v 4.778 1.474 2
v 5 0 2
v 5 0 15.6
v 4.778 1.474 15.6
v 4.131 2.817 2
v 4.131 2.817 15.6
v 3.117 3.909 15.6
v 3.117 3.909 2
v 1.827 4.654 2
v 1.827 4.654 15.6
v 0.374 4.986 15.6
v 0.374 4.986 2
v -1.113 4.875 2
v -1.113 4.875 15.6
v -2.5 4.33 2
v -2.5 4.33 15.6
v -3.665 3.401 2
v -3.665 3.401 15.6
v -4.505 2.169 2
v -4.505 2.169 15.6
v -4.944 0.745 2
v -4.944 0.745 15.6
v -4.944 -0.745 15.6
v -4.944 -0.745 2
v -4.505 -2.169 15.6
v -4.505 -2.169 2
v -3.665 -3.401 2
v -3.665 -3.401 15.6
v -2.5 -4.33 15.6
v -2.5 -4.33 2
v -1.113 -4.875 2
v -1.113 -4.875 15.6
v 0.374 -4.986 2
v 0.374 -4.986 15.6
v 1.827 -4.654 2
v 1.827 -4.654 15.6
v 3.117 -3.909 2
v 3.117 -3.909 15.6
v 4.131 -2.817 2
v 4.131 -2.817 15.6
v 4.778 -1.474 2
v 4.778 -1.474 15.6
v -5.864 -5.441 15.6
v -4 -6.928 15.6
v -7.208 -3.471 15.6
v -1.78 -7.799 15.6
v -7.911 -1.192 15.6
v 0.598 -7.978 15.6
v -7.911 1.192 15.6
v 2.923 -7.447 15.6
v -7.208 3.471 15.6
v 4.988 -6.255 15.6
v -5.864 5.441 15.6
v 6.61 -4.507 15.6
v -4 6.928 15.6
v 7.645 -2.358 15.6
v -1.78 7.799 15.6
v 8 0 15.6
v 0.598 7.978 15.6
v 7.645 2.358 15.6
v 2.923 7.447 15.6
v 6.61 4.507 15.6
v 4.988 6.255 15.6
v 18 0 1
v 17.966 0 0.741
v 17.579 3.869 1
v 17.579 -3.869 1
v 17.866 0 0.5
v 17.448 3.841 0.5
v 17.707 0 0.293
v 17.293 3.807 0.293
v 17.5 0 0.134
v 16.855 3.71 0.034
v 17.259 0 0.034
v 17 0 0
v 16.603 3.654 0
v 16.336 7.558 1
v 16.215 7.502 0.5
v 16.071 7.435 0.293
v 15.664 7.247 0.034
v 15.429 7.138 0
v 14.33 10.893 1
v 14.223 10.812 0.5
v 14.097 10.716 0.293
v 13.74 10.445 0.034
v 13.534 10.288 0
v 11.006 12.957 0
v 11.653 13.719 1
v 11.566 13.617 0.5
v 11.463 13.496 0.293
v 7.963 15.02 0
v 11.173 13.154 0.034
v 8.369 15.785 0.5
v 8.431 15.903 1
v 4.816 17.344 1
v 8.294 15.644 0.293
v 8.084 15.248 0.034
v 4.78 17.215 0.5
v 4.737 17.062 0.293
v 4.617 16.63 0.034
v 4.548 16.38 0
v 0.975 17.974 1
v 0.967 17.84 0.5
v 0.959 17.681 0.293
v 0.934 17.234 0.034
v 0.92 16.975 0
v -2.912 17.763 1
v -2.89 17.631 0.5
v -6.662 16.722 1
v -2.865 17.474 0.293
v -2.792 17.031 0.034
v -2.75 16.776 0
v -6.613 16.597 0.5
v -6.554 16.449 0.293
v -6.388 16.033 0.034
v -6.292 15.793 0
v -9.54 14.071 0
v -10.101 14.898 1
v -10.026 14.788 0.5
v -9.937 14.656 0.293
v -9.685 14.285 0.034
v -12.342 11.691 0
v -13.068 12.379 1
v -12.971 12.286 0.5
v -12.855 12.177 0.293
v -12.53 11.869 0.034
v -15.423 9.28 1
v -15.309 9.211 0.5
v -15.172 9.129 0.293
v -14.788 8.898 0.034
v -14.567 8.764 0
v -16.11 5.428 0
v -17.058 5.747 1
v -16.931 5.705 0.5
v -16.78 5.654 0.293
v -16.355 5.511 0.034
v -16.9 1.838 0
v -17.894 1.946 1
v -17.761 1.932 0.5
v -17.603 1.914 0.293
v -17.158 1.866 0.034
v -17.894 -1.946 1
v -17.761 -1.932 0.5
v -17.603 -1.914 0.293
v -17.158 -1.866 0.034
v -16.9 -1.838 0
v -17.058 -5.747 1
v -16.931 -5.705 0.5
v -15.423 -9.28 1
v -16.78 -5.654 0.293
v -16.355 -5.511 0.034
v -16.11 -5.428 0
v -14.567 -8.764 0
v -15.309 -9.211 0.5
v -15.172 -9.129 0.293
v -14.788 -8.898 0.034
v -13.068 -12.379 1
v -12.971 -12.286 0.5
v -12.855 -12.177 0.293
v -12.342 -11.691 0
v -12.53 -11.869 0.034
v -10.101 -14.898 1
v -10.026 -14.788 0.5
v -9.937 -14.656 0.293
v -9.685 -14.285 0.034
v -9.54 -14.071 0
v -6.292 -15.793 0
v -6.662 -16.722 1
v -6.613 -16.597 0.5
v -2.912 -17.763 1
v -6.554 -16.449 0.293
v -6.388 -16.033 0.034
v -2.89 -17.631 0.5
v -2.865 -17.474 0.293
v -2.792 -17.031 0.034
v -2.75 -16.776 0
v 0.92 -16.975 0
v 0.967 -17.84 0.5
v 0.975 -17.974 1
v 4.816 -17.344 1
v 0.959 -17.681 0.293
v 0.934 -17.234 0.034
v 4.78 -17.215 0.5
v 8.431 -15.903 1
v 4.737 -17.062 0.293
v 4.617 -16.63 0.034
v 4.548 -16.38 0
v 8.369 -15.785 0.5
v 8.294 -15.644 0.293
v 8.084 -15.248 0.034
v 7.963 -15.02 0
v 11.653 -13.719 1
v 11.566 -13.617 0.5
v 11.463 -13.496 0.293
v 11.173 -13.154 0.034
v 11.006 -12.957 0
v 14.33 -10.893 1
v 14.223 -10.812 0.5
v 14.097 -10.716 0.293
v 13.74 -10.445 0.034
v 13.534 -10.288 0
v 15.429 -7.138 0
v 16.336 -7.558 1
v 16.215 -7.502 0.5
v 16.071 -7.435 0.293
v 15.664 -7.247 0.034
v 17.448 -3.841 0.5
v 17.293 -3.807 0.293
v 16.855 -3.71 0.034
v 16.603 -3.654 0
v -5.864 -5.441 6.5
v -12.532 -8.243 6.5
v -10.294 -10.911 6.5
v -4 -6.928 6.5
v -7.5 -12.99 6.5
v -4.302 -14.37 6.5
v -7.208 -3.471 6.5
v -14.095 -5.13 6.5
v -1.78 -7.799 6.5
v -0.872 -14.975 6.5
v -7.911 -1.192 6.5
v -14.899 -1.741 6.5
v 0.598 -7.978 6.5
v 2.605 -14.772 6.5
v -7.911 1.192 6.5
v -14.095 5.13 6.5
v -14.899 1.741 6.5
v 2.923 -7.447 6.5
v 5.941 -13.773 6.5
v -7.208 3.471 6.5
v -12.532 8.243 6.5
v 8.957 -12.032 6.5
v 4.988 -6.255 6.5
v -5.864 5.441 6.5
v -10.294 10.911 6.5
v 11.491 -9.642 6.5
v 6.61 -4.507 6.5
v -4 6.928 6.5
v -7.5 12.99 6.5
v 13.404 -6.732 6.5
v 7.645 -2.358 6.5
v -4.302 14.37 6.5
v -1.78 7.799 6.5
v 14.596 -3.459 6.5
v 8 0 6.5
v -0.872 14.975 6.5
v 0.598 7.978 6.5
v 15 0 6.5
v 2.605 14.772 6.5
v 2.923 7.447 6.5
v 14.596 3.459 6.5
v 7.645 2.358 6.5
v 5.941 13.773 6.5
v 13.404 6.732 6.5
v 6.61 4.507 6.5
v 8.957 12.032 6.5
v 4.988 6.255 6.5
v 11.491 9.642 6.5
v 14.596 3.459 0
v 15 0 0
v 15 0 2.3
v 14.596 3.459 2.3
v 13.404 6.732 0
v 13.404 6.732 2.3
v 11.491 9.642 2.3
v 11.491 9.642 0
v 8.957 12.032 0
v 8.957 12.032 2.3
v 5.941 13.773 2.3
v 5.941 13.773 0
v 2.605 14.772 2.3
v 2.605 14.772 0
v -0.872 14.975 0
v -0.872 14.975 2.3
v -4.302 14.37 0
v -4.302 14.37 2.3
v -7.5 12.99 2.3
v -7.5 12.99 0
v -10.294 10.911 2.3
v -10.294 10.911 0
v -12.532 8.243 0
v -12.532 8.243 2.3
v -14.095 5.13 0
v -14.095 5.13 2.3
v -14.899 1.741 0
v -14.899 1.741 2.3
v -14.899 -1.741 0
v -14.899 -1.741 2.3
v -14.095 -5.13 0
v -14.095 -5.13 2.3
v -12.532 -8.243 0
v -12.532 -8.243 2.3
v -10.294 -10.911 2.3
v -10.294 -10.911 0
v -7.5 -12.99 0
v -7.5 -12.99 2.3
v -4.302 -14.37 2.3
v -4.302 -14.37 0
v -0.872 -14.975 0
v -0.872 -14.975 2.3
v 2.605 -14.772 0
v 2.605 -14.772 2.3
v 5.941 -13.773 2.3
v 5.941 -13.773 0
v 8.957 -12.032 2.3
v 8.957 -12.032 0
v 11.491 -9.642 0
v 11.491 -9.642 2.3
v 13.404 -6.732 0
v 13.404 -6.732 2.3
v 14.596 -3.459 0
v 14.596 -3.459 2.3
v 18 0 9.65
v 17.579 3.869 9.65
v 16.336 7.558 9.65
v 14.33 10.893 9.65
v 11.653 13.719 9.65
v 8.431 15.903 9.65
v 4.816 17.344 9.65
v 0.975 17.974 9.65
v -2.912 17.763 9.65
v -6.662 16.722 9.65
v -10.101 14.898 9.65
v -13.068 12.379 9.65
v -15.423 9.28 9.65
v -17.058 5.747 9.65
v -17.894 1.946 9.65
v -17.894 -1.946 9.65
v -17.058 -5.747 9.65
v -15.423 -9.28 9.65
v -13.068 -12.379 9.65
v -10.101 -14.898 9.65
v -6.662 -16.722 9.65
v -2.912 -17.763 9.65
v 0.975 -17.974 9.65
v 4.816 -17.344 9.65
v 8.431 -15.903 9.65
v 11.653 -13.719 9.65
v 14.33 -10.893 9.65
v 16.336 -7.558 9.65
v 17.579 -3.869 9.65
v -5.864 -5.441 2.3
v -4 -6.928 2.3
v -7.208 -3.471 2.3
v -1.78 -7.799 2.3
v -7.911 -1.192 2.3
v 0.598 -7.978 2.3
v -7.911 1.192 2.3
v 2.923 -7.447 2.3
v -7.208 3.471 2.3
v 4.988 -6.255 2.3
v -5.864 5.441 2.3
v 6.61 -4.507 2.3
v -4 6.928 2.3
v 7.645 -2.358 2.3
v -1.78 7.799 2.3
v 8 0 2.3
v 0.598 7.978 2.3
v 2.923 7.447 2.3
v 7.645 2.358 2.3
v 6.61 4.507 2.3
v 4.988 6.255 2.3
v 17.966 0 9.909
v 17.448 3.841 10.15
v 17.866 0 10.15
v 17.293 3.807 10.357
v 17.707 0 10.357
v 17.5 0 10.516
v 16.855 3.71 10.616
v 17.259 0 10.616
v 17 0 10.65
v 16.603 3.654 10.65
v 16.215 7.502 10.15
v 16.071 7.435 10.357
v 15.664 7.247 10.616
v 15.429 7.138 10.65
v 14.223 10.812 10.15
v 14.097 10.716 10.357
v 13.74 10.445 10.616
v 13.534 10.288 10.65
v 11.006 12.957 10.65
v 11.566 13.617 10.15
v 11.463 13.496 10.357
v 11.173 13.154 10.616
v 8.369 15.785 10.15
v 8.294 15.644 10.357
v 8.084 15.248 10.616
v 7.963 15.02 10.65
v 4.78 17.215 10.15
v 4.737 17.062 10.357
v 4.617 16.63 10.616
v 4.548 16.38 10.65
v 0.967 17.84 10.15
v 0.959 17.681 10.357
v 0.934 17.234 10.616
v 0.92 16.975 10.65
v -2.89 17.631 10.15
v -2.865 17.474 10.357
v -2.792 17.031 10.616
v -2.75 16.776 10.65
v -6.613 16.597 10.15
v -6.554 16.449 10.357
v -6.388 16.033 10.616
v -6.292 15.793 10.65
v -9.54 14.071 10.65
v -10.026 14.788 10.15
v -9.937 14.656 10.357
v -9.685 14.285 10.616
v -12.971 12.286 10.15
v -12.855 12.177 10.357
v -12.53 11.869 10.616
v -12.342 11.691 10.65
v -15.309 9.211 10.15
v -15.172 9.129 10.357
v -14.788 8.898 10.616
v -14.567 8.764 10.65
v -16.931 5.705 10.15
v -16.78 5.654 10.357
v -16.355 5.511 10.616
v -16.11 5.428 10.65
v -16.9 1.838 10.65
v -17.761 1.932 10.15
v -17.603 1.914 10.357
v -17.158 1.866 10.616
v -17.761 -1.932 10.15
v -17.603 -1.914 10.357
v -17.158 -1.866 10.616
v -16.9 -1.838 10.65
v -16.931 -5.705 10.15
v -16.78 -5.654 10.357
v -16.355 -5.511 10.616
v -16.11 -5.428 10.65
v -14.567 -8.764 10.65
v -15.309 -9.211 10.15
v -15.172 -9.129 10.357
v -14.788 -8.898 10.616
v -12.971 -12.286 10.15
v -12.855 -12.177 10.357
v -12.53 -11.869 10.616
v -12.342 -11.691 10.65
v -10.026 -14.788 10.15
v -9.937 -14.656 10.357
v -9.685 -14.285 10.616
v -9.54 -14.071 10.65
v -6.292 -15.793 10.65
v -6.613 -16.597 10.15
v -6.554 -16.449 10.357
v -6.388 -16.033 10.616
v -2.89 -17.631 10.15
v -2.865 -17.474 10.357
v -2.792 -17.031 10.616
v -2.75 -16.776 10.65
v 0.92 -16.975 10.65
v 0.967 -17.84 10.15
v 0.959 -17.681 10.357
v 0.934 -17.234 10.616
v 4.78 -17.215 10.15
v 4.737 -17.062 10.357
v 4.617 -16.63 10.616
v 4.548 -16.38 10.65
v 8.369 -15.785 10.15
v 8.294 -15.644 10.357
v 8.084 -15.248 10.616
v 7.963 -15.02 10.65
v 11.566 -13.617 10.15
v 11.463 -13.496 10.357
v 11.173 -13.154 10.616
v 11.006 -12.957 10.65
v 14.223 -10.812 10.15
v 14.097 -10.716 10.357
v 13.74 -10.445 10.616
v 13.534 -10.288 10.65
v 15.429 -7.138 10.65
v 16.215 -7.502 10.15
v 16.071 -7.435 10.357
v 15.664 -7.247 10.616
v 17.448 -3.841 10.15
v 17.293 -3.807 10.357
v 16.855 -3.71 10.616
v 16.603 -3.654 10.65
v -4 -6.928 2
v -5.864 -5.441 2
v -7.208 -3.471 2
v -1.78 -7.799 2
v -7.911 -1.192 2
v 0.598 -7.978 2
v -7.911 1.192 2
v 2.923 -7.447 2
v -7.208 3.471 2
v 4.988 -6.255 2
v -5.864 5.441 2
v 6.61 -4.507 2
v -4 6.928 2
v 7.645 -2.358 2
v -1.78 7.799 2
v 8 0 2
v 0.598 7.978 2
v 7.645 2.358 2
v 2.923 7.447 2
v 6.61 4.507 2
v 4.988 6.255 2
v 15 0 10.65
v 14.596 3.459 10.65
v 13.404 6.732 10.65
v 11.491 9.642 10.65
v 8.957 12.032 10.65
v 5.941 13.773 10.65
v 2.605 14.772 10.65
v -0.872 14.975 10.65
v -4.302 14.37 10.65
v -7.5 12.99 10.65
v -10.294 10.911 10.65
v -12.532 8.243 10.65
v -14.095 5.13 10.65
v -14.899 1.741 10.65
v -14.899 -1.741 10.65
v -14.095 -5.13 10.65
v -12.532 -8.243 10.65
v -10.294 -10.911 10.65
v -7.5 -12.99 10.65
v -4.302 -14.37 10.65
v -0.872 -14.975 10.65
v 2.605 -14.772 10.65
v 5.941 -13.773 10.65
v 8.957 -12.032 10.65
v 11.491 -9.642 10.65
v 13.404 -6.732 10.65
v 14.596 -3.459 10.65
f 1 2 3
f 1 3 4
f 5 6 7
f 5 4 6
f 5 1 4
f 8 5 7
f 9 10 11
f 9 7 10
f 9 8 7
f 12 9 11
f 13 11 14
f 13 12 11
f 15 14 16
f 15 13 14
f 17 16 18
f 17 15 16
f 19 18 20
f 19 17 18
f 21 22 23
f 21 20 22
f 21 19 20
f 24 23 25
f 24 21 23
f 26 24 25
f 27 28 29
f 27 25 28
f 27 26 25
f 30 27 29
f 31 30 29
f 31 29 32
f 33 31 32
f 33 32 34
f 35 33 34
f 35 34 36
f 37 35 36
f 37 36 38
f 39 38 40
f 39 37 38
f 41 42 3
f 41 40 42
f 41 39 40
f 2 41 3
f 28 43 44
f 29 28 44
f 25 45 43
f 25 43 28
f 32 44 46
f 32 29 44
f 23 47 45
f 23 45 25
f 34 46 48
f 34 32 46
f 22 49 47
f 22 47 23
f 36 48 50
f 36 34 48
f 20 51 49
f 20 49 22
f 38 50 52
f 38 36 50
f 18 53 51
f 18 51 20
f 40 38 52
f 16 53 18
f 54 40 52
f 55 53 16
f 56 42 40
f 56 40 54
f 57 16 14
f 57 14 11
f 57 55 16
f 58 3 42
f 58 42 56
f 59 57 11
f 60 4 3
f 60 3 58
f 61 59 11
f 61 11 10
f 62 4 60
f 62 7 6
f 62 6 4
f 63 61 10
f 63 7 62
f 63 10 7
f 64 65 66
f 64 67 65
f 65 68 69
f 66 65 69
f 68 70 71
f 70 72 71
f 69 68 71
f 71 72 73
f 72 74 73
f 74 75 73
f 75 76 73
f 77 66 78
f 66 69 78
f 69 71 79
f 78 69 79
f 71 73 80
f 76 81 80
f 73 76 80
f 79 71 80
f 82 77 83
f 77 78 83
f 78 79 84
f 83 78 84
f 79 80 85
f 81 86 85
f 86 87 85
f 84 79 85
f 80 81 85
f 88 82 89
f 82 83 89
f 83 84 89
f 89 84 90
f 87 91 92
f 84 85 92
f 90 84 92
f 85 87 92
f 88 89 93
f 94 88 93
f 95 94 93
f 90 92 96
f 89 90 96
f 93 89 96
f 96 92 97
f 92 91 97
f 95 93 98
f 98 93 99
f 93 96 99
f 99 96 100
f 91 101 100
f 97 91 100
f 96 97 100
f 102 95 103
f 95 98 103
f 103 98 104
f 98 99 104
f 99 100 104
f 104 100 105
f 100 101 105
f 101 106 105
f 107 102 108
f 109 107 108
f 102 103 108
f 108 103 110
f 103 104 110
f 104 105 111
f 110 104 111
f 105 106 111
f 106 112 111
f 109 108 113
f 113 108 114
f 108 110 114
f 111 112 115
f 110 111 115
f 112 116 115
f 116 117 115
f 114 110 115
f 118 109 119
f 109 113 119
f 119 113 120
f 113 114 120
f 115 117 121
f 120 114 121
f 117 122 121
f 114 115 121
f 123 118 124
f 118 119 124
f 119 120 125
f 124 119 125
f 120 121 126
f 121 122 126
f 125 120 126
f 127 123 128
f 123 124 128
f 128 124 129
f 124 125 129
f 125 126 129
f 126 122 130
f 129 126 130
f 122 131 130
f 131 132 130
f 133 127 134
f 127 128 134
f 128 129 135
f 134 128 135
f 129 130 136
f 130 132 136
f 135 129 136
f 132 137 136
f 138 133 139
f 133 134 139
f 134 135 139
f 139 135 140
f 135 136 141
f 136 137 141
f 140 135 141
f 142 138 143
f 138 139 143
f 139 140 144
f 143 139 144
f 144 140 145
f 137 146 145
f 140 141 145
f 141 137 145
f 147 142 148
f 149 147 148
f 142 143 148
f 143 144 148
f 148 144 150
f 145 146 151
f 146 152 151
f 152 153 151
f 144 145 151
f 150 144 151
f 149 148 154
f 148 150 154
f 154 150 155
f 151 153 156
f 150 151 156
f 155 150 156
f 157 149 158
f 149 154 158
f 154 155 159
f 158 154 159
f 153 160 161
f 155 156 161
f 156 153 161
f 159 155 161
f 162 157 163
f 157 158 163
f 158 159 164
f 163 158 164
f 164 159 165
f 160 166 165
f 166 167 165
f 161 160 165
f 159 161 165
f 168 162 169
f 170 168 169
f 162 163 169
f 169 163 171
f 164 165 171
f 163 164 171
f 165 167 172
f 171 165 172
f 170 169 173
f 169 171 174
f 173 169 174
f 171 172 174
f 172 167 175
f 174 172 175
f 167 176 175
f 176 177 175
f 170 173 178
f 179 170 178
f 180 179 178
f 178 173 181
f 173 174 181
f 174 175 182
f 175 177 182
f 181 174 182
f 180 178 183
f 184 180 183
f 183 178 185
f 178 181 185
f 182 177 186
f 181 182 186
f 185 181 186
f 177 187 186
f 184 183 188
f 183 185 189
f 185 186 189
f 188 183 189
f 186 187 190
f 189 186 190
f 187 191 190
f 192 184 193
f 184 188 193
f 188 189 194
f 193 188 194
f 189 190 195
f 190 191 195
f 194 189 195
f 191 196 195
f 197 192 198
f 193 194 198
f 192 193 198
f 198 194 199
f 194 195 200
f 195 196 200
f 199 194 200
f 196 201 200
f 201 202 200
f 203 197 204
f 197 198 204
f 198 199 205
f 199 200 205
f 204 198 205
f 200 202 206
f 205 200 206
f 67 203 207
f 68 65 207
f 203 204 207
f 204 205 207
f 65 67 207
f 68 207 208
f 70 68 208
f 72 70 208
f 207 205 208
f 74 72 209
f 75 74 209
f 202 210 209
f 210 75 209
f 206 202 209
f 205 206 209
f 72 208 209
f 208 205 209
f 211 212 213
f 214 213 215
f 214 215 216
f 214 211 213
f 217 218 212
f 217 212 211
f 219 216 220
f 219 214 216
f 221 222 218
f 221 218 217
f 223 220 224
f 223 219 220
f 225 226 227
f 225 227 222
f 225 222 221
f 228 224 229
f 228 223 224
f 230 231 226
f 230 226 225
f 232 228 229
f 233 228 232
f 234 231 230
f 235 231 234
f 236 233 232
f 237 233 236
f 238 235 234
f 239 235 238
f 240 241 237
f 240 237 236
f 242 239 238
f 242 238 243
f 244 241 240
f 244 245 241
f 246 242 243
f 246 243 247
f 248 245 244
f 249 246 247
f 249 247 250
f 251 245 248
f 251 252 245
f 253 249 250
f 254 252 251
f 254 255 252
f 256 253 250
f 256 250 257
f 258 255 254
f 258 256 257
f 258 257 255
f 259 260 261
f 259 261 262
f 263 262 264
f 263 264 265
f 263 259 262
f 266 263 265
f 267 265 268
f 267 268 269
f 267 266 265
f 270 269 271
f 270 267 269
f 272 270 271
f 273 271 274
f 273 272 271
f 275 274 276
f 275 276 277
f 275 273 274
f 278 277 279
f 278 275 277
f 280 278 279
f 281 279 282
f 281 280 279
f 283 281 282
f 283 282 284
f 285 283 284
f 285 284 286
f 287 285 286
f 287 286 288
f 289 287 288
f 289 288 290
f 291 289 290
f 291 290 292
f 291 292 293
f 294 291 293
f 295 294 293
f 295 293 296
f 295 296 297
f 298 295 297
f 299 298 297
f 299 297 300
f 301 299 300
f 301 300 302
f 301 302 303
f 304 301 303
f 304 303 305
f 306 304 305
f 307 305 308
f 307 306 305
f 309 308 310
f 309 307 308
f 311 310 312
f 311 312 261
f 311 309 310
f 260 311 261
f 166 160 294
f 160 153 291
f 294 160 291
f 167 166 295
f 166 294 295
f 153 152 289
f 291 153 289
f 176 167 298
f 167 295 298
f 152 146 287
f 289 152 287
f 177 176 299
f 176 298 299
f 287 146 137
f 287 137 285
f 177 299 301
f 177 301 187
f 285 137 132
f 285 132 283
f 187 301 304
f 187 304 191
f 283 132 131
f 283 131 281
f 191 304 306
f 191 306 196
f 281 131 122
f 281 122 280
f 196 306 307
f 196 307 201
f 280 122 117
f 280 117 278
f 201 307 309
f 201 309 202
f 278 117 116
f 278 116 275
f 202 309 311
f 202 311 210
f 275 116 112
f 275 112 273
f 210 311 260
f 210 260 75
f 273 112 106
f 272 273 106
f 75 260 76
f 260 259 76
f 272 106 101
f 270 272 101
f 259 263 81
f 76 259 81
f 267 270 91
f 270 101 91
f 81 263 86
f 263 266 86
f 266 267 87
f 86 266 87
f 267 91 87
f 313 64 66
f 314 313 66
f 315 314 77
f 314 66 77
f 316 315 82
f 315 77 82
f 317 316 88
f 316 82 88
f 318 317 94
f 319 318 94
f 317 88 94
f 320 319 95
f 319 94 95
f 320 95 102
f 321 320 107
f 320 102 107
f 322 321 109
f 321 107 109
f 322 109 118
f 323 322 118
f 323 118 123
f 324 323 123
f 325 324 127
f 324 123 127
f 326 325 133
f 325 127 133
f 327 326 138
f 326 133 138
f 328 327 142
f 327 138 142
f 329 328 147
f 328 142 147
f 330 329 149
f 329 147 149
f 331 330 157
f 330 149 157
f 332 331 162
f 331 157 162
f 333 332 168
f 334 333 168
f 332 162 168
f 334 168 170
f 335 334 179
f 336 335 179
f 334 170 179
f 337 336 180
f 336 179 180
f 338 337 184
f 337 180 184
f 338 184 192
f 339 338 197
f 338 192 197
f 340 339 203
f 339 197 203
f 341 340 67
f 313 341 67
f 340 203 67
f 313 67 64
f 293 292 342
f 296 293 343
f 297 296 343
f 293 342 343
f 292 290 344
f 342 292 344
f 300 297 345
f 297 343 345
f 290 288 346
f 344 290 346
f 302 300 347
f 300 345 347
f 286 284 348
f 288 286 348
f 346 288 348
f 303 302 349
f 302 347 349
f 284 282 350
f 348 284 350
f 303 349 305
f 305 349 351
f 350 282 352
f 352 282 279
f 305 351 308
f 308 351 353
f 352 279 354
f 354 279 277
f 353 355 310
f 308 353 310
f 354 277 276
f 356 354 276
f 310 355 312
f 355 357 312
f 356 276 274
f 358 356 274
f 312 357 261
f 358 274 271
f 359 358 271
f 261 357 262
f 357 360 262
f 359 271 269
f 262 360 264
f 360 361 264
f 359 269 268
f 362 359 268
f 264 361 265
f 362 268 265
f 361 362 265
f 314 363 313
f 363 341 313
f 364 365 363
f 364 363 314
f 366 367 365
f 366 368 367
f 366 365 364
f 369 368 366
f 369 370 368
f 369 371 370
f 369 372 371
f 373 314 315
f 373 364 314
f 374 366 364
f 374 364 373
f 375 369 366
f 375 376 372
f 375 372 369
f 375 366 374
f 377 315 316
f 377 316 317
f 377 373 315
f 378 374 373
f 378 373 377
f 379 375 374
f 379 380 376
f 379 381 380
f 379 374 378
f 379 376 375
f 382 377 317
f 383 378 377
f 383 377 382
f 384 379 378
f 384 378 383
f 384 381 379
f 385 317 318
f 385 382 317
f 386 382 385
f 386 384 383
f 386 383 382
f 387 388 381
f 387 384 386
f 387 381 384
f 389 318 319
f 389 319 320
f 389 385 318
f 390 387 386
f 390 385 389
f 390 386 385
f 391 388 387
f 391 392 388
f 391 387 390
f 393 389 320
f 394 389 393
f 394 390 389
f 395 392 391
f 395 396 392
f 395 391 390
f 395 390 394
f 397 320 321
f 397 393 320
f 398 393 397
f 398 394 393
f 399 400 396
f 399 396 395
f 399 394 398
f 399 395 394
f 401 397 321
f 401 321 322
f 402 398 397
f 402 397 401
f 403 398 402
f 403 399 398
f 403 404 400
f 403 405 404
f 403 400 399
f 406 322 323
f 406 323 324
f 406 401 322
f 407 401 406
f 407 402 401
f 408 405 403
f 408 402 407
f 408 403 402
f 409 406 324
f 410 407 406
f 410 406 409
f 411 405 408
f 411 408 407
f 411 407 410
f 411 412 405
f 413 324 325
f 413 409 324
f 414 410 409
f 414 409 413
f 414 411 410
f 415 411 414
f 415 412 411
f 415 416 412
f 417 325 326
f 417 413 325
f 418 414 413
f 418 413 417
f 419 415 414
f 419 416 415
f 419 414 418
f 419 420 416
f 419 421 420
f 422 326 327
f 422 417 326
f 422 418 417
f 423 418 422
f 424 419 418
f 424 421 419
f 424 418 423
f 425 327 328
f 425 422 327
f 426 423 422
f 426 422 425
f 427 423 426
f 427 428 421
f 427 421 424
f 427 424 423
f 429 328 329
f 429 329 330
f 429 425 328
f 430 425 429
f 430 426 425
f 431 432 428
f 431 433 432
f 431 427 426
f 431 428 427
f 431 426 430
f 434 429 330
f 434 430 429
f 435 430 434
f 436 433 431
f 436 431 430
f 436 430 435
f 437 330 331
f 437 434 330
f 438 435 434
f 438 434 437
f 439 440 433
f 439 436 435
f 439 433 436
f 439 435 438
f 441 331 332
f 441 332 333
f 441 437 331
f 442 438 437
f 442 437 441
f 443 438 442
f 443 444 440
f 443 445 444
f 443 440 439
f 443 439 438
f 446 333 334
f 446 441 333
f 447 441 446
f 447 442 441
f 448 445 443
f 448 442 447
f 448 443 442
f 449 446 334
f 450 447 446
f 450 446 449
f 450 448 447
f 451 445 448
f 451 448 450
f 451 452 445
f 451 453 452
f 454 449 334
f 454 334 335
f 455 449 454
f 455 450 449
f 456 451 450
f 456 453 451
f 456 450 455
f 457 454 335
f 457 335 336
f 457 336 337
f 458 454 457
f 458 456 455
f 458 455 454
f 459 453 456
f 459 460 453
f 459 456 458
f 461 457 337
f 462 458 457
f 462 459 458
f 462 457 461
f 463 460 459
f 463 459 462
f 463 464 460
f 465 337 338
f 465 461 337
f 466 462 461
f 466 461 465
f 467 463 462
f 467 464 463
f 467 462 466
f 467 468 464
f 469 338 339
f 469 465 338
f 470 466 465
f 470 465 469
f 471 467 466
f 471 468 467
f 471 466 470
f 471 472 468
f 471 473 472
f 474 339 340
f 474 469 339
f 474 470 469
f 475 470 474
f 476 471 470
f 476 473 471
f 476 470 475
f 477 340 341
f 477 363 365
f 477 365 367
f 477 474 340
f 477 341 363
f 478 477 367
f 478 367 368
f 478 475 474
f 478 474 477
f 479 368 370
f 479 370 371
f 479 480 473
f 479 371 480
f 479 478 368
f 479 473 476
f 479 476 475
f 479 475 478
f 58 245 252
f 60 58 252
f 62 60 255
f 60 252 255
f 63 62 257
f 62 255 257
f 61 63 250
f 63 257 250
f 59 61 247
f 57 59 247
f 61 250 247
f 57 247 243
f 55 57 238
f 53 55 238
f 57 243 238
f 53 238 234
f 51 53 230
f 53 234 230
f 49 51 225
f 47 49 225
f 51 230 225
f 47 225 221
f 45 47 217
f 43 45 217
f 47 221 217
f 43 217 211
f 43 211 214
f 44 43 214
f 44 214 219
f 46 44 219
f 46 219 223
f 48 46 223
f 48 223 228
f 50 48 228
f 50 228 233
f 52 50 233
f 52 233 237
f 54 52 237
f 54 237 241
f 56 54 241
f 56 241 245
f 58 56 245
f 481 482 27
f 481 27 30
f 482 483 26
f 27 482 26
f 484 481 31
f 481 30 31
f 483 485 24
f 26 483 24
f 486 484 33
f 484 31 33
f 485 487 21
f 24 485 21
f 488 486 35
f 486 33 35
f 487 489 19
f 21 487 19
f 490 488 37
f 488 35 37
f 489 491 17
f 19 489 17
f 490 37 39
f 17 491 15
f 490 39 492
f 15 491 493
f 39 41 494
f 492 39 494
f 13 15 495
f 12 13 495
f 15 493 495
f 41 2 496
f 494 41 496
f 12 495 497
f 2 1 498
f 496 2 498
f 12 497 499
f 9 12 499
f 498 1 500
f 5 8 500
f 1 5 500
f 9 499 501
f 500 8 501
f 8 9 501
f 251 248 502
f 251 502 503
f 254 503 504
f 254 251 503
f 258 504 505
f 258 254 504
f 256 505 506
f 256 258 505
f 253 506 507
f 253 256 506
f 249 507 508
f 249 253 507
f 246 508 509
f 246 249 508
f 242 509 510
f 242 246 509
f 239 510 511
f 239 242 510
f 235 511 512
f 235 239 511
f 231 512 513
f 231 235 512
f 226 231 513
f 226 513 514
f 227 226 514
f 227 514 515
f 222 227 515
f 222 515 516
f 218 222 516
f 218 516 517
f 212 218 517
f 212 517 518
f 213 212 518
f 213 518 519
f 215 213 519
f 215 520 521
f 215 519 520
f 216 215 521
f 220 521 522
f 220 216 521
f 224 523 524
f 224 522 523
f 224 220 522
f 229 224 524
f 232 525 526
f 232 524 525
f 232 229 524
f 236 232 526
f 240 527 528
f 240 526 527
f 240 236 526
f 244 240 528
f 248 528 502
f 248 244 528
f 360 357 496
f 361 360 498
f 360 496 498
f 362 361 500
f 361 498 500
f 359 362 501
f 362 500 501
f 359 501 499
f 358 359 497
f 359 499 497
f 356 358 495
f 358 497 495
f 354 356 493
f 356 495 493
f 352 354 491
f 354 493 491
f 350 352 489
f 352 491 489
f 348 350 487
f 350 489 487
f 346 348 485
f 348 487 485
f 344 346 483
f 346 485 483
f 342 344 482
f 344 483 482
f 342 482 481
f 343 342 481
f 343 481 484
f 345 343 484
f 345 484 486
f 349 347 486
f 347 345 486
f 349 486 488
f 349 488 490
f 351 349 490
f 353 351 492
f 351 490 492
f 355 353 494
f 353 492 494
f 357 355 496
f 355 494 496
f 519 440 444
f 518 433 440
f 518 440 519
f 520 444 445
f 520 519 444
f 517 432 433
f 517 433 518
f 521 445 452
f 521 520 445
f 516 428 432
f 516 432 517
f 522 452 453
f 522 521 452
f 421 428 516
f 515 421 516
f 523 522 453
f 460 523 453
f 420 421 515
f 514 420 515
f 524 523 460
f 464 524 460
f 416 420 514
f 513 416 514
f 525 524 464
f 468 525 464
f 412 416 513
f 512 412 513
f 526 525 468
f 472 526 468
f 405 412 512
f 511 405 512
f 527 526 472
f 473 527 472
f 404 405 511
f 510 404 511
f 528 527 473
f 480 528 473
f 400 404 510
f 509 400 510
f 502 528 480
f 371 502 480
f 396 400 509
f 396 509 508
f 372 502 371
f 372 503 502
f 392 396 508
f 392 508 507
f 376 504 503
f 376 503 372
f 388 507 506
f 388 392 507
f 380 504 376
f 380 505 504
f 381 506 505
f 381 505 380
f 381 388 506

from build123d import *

# Parameters (mm, degrees)
CYLINDER004_R     = 5
CYLINDER004_DEPTH = 25.6
CYLINDER002_R     = 15
CYLINDER002_DEPTH = 2.8
CYLINDER001_R     = 15
CYLINDER001_DEPTH = 4.5
CYLINDER_R        = 18
CYLINDER_DEPTH    = 10.65
CYLINDER003_R     = 8
CYLINDER003_DEPTH = 13.6
FILLET_R          = 1
FILLET001_R       = 1


with BuildPart() as cylinder004:
    # Cylinder004 → Cylinder004 (new body)
    with BuildSketch(Plane.XY.offset(-1)):
        Circle(CYLINDER004_R)
    extrude(amount=CYLINDER004_DEPTH)


with BuildPart() as cylinder002:
    # Cylinder002 → Cylinder002 (new body)
    with BuildSketch(Plane.XY.offset(-0.5)):
        Circle(CYLINDER002_R)
    extrude(amount=CYLINDER002_DEPTH)


with BuildPart() as cylinder001:
    # Cylinder001 → Cylinder001 (new body)
    with BuildSketch(Plane.XY.offset(6.5)):
        Circle(CYLINDER001_R)
    extrude(amount=CYLINDER001_DEPTH)


with BuildPart() as cut001:
    # Cylinder → Cylinder (new body)
    with BuildSketch(Plane.XY):
        Circle(CYLINDER_R)
    extrude(amount=CYLINDER_DEPTH)

    # Cut: cut Cylinder001
    add(cylinder001.part, mode=Mode.SUBTRACT)

    # Cut001: cut Cylinder002
    add(cylinder002.part, mode=Mode.SUBTRACT)


with BuildPart() as body:
    # Cylinder003 → Cylinder003 (new body)
    with BuildSketch(Plane.XY.offset(2)):
        Circle(CYLINDER003_R)
    extrude(amount=CYLINDER003_DEPTH)

    # Fusion: union Cut001
    add(cut001.part)

    # Cut002: cut Cylinder004
    add(cylinder004.part, mode=Mode.SUBTRACT)

    # Fillet
    fillet_edges = [body.edges().sort_by_distance(p)[0] for p in [
        (-18, 0, 10.65),
    ]]
    fillet(fillet_edges, radius=FILLET_R)

    # Fillet001
    fillet001_edges = [body.edges().sort_by_distance(p)[0] for p in [
        (-18, 0, 0),
    ]]
    fillet(fillet001_edges, radius=FILLET001_R)


solid = body.part
